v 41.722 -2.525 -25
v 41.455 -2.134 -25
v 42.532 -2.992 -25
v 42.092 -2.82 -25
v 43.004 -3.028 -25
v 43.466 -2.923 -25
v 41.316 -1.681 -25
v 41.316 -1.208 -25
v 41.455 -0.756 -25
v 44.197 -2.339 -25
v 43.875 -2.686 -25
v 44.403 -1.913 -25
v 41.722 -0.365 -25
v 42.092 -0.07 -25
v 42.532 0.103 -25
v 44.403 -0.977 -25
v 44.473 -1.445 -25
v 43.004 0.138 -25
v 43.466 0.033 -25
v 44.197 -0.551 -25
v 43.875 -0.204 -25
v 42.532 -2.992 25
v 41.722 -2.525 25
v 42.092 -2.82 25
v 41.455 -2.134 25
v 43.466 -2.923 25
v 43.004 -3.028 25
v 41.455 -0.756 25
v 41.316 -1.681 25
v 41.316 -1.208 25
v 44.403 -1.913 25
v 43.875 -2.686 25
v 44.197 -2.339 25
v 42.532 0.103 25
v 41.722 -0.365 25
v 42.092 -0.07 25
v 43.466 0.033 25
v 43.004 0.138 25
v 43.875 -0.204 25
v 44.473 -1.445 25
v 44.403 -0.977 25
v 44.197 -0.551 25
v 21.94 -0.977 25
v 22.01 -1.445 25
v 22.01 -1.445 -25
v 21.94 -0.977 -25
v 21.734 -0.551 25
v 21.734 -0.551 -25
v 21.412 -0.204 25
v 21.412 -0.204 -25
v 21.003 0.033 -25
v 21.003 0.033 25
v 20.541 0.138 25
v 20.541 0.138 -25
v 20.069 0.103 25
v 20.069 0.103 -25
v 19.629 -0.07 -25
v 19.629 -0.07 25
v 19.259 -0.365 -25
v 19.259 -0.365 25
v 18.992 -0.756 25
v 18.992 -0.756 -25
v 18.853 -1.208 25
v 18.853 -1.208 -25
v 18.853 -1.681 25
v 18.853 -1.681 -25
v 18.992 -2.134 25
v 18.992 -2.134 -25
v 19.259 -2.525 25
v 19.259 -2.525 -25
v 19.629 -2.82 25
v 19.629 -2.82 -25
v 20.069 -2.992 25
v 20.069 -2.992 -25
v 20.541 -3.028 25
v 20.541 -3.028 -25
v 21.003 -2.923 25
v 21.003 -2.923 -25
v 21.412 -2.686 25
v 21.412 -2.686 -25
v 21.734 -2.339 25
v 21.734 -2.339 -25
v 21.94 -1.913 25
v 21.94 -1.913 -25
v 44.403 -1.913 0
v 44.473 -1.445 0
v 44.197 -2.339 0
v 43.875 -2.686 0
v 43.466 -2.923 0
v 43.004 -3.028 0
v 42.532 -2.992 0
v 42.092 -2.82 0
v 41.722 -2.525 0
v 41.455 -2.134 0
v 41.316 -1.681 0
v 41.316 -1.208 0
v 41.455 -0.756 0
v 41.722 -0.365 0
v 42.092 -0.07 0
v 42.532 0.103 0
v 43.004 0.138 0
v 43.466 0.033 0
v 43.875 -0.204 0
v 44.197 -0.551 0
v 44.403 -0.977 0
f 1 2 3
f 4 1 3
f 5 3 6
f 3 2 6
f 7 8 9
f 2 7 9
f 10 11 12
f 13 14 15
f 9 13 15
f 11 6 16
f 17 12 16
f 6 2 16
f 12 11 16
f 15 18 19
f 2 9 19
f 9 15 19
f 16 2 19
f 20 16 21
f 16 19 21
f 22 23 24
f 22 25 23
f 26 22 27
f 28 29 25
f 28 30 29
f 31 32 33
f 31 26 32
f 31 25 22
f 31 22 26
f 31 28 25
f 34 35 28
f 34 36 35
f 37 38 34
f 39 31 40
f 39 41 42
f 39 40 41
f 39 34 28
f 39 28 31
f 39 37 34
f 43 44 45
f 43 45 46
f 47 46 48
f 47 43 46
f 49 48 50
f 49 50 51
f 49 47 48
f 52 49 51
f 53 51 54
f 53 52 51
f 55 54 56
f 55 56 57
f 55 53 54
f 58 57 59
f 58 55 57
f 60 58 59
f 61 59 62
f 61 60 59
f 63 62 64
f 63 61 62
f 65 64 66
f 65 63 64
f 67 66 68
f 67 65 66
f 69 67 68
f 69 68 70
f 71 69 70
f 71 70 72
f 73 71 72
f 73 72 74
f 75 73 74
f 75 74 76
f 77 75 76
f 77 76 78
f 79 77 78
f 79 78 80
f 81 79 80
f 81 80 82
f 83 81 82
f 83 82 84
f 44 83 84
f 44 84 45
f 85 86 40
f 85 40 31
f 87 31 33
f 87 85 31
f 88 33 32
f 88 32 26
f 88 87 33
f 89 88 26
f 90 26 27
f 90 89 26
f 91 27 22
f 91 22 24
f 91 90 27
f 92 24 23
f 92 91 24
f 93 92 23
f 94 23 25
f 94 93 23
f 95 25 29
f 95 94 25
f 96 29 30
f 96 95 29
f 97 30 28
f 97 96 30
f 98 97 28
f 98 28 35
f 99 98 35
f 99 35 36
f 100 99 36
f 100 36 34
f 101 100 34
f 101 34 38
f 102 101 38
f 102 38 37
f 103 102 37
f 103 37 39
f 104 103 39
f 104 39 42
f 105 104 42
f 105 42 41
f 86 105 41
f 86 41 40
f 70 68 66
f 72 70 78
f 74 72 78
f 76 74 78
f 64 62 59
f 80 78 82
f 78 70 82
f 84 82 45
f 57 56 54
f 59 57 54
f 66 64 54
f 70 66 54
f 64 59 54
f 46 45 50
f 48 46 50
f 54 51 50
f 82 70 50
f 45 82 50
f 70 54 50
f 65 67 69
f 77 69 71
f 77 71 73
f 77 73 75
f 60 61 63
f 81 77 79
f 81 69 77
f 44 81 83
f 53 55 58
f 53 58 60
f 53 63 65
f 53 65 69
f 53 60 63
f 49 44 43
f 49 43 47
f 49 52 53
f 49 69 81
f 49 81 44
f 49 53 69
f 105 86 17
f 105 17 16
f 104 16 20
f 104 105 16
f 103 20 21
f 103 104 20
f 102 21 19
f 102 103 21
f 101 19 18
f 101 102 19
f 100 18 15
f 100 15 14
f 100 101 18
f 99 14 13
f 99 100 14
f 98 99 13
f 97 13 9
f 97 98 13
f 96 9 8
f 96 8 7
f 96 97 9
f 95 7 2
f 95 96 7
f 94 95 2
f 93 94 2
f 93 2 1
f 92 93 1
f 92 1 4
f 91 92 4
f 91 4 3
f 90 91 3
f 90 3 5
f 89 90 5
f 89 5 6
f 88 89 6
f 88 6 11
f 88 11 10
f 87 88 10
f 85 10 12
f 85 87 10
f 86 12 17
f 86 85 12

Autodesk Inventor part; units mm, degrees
ref_plane "YZ Plane" through (0, 0, 0) normal (1, 0, 0) x (0, 1, 0)
ref_plane "XZ Plane" through (0, 0, 0) normal (0, 1, 0) x (-1, 0, 0)
ref_plane "XY Plane" through (0, 0, 0) normal (0, 0, 1) x (1, 0, 0)
surface "Composite1"
sketch "Sketch2" plane through (0, 0, 0) normal (0, 0, 1) x (1, 0, 0)
  line L0 (39.5181, -1.4448) -> (22.0101, -1.4448) projected
  circle A0 centre (20.4226, -1.4448) radius 1.5875
  line L1 (23.7903, -1.4448) -> (41.2982, -1.4448) projected
  circle A1 centre (42.8857, -1.4448) radius 1.5875
  line L2 (20.4226, -1.4448) -> (42.8857, -1.4448) construction
  point P0 (0, 0)
  dimension "d1" = 3.175
extrude "Extrusion1" add sketch "Sketch2" against normal mid plane 50
properties part number "Harken 22mm Cheek" material "Aluminum 6061"
